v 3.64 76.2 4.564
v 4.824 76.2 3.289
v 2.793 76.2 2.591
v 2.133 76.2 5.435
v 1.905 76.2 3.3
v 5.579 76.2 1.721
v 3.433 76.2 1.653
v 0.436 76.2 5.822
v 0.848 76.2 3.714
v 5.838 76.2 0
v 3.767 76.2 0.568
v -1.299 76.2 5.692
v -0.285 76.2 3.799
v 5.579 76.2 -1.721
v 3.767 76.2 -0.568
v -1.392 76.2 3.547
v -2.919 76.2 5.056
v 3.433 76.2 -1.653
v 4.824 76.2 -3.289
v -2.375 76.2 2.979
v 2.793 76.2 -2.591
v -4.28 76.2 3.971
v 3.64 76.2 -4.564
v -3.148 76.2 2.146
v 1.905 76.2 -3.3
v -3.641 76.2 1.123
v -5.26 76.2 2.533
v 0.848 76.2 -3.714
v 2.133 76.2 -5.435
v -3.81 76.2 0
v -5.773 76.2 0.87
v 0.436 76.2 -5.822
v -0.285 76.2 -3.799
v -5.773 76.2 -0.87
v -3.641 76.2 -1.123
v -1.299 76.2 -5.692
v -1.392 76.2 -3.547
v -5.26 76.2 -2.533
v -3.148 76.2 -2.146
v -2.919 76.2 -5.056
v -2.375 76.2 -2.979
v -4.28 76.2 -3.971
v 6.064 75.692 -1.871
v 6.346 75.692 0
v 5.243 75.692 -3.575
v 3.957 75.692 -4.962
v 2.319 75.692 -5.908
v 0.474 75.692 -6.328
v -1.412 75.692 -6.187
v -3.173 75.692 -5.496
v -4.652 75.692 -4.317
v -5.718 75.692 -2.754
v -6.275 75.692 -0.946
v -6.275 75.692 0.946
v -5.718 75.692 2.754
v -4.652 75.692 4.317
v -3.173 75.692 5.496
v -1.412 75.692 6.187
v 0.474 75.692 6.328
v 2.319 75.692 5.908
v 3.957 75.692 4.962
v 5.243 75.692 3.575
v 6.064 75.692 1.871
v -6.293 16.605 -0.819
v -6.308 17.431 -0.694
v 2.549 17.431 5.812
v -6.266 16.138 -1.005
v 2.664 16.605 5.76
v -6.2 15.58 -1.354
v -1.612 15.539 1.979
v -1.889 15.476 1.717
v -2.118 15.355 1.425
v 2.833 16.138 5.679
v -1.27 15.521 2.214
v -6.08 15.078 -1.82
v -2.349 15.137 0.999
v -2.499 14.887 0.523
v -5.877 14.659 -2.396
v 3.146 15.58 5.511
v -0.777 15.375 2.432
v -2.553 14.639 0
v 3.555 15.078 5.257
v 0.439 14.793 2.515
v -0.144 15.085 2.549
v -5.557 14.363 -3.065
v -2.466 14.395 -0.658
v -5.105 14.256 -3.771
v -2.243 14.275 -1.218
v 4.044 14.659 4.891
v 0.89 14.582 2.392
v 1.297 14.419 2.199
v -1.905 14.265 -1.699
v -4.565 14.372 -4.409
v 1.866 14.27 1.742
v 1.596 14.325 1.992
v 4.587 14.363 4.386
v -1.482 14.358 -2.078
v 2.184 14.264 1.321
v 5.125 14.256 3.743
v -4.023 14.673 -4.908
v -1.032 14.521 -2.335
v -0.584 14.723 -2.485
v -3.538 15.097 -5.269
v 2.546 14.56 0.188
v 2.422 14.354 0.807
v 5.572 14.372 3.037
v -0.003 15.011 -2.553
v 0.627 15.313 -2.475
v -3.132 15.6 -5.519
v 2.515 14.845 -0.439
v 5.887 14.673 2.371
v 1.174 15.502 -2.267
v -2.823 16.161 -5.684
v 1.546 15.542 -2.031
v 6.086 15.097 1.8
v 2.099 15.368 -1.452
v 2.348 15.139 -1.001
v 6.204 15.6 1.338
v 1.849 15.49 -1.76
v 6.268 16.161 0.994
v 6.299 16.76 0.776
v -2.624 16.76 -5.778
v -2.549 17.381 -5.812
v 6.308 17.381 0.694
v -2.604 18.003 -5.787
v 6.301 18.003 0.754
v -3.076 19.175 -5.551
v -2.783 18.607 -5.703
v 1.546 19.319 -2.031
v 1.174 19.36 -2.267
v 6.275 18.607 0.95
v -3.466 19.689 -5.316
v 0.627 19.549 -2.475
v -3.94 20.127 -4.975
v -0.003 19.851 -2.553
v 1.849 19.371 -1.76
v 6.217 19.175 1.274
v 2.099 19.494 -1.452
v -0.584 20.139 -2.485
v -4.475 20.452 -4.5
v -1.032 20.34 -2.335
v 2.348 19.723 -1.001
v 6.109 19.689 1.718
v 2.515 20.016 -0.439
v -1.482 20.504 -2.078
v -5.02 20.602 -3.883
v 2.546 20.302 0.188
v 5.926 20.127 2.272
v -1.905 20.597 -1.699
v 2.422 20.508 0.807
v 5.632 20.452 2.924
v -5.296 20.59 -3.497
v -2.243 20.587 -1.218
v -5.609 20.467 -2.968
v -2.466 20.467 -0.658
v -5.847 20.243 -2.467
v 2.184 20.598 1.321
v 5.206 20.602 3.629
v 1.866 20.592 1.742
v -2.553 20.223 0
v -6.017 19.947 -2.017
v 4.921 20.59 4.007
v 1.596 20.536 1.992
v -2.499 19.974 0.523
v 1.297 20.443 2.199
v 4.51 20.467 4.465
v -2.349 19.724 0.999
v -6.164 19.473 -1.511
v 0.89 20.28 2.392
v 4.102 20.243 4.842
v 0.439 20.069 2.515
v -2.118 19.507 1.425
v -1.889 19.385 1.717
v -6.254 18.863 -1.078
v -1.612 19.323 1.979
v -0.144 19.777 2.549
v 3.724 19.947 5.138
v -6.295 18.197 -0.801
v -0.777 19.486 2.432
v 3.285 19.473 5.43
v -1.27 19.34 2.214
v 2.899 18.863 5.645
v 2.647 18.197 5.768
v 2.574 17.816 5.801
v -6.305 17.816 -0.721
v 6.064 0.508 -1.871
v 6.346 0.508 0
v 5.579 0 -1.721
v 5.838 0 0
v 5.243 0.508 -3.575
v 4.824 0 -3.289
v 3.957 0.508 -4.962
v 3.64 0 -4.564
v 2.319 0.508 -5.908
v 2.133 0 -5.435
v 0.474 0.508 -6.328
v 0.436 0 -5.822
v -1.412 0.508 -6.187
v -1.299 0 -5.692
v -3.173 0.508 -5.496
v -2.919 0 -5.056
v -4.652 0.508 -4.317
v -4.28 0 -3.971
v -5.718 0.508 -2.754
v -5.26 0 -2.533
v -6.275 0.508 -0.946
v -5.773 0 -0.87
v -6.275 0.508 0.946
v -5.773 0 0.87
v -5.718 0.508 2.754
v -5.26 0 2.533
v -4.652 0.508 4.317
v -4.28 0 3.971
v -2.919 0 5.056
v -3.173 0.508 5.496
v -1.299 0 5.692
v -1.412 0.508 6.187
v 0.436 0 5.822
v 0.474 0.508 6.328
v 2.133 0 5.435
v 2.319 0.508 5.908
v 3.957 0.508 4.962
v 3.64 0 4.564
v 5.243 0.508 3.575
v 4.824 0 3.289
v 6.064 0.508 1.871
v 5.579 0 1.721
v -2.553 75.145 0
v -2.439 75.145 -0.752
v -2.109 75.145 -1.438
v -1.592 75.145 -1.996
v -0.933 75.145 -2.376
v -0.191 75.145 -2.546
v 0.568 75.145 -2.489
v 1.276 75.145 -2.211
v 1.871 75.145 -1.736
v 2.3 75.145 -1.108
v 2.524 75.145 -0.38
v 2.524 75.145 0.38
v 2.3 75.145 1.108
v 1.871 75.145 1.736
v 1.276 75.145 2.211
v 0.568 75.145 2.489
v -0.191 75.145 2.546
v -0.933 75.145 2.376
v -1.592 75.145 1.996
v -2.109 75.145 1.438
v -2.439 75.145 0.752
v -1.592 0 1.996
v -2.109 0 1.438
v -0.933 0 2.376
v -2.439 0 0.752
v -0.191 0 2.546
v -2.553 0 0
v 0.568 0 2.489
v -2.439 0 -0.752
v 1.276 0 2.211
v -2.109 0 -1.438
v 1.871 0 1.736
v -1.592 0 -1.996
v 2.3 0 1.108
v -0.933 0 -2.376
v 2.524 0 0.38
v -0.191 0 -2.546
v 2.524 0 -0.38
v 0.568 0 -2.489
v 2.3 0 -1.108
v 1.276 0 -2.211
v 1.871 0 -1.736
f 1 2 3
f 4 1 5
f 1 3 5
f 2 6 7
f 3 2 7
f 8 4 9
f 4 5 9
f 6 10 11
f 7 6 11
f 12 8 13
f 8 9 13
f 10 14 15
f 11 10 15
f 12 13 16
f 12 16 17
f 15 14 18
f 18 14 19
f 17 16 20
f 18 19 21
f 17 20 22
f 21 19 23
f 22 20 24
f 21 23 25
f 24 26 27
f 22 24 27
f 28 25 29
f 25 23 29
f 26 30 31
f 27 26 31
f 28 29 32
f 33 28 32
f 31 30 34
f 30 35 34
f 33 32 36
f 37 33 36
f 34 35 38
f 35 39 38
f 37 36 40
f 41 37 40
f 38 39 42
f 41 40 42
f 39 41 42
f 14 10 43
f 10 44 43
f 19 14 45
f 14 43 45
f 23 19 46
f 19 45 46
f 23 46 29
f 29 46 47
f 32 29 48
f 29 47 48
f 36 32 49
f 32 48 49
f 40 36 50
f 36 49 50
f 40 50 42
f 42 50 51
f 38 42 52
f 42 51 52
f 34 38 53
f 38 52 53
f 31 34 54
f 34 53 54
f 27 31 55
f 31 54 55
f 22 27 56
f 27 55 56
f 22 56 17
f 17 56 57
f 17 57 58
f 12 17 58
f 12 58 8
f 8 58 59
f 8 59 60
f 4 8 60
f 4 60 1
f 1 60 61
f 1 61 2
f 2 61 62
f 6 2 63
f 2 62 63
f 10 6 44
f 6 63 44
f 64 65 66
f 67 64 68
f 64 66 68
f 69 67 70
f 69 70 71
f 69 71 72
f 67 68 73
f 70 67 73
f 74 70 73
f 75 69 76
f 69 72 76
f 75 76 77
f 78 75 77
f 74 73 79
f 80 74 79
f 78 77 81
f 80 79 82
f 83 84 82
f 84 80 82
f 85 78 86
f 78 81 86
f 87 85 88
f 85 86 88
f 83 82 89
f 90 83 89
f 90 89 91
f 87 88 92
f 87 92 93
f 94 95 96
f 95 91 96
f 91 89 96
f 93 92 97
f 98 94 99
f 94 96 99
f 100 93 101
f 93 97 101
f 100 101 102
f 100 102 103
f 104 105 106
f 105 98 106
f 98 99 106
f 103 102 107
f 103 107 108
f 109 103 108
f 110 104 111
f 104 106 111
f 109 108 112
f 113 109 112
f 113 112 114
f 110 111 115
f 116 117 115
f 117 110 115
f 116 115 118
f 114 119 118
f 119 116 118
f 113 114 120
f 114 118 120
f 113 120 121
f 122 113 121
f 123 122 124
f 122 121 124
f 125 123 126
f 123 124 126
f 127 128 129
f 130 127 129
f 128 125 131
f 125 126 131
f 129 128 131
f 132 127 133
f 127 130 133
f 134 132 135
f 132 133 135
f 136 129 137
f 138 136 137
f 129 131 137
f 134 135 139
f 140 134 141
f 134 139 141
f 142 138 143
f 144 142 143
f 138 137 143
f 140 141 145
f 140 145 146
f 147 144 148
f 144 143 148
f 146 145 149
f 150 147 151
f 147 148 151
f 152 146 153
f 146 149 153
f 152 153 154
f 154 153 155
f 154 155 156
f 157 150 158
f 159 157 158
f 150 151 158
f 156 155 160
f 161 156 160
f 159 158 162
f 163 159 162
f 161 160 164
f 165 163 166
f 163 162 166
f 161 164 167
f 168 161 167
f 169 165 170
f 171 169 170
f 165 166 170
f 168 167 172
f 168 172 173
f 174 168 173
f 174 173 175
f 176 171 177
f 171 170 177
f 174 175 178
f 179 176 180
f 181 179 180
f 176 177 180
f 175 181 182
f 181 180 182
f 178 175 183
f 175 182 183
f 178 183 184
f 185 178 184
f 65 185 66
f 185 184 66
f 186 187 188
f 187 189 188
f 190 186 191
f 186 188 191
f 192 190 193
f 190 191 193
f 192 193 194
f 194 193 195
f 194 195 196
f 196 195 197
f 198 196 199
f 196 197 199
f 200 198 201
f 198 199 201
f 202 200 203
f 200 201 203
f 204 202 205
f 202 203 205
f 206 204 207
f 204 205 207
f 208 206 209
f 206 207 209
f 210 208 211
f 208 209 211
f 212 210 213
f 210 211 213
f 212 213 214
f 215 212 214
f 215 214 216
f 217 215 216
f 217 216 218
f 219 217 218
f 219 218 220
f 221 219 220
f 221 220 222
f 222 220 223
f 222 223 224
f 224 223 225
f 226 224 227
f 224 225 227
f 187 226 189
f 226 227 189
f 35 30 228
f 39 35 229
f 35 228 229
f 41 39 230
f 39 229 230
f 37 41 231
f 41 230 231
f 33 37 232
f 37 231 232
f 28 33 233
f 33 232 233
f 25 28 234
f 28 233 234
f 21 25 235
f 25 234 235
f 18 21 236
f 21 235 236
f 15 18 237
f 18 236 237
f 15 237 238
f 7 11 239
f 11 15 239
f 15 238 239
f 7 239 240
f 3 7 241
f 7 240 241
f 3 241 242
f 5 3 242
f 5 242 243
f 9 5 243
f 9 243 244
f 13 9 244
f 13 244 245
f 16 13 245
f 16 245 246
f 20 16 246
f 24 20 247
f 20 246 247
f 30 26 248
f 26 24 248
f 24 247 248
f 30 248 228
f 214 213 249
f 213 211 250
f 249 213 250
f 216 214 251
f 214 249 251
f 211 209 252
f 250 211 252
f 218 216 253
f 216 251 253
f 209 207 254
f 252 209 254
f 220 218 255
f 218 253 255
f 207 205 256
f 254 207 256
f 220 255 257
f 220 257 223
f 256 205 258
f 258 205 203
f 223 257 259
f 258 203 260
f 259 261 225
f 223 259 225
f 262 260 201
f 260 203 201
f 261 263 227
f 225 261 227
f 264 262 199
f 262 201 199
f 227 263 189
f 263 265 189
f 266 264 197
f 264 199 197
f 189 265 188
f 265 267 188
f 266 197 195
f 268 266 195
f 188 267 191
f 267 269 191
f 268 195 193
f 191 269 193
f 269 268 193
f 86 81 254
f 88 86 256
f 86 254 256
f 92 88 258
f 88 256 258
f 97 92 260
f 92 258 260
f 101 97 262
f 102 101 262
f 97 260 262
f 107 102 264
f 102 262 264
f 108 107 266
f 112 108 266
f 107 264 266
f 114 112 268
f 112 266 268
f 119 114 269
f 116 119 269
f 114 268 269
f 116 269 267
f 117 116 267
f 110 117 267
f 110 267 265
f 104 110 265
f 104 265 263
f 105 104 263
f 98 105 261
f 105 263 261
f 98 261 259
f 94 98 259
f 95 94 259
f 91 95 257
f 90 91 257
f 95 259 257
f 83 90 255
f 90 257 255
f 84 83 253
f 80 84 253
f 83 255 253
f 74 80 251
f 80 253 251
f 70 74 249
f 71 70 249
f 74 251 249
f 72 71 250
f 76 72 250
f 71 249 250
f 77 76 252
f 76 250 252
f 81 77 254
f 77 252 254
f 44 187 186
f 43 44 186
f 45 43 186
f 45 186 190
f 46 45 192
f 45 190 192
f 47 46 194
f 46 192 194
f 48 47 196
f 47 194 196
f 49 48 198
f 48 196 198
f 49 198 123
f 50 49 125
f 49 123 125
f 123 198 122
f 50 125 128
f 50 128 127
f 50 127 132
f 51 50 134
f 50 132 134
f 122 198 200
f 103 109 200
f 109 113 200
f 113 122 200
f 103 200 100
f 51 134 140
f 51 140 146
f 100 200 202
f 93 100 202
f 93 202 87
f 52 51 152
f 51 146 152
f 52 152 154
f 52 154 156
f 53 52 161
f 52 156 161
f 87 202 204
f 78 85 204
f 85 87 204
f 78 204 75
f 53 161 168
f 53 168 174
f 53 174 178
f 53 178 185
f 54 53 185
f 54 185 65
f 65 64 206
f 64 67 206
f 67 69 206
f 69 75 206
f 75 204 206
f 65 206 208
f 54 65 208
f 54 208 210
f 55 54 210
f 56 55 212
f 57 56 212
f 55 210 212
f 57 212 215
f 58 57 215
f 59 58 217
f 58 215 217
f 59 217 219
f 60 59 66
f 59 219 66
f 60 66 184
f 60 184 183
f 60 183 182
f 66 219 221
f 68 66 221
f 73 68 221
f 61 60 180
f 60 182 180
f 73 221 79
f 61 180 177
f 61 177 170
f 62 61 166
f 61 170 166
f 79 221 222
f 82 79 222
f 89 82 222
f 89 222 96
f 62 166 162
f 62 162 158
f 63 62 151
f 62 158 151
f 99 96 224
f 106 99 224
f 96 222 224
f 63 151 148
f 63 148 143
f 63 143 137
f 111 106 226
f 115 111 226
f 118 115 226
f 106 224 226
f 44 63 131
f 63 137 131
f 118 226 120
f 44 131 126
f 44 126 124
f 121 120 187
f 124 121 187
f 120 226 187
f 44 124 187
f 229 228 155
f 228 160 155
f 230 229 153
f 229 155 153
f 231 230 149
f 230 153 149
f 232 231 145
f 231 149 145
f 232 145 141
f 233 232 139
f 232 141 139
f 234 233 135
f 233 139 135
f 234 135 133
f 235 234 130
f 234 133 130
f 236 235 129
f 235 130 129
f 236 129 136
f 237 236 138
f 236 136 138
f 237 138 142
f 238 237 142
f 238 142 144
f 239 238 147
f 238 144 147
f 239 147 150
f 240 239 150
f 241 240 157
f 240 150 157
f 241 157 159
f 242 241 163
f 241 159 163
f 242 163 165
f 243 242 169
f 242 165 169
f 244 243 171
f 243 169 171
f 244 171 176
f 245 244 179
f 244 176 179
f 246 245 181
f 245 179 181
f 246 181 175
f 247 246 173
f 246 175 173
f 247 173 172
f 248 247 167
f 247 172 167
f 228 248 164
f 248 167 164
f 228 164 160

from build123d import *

# Parameters (mm, degrees)
F_1_4_20_TAPPED_HOLE1_D           = 5.1054
F_1_4_20_TAPPED_HOLE1_DEPTH       = 76.2
F_1_4_20_TAPPED_HOLE1_CSINK_D     = 7.62
F_1_4_20_TAPPED_HOLE1_CSINK_ANGLE = 100
F_1_4_0_25_DIAMETER_HOLE1_D       = 6.35


with BuildPart() as part:
    # Sketch1 → Revolve1 (revolve)
    with BuildSketch(Plane(origin=(0, 0, 0), x_dir=(-1, 0, 0), z_dir=(0, 0, -1))):
        Polygon((-5.83819, 0), (0, 0), (0, 76.2), (-5.83819, 76.2), (-6.34619, 75.692), (-6.34619, 0.508), align=None)
    revolve(axis=Axis((0, 0, 0), (0, 1, 0)))

    # 1/4-20 Tapped Hole1
    with Locations(Plane(origin=(0, 76.2, 0), x_dir=(1, 0, 0), z_dir=(0, 1, 0))):
        with Locations((0, 0)):
            CounterSinkHole(F_1_4_20_TAPPED_HOLE1_D / 2, F_1_4_20_TAPPED_HOLE1_CSINK_D / 2, depth=F_1_4_20_TAPPED_HOLE1_DEPTH, counter_sink_angle=F_1_4_20_TAPPED_HOLE1_CSINK_ANGLE)

    # 1/4 (0.25) Diameter Hole1 (through all)
    with Locations(Plane(origin=(-5.114677075, 17.430811078, -3.756887799), x_dir=(0.591991068, 0, -0.805944523), z_dir=(-0.805944523, 0, -0.591991068))):
        with Locations((0, 0)):
            Hole(F_1_4_0_25_DIAMETER_HOLE1_D / 2)


solid = part.part
